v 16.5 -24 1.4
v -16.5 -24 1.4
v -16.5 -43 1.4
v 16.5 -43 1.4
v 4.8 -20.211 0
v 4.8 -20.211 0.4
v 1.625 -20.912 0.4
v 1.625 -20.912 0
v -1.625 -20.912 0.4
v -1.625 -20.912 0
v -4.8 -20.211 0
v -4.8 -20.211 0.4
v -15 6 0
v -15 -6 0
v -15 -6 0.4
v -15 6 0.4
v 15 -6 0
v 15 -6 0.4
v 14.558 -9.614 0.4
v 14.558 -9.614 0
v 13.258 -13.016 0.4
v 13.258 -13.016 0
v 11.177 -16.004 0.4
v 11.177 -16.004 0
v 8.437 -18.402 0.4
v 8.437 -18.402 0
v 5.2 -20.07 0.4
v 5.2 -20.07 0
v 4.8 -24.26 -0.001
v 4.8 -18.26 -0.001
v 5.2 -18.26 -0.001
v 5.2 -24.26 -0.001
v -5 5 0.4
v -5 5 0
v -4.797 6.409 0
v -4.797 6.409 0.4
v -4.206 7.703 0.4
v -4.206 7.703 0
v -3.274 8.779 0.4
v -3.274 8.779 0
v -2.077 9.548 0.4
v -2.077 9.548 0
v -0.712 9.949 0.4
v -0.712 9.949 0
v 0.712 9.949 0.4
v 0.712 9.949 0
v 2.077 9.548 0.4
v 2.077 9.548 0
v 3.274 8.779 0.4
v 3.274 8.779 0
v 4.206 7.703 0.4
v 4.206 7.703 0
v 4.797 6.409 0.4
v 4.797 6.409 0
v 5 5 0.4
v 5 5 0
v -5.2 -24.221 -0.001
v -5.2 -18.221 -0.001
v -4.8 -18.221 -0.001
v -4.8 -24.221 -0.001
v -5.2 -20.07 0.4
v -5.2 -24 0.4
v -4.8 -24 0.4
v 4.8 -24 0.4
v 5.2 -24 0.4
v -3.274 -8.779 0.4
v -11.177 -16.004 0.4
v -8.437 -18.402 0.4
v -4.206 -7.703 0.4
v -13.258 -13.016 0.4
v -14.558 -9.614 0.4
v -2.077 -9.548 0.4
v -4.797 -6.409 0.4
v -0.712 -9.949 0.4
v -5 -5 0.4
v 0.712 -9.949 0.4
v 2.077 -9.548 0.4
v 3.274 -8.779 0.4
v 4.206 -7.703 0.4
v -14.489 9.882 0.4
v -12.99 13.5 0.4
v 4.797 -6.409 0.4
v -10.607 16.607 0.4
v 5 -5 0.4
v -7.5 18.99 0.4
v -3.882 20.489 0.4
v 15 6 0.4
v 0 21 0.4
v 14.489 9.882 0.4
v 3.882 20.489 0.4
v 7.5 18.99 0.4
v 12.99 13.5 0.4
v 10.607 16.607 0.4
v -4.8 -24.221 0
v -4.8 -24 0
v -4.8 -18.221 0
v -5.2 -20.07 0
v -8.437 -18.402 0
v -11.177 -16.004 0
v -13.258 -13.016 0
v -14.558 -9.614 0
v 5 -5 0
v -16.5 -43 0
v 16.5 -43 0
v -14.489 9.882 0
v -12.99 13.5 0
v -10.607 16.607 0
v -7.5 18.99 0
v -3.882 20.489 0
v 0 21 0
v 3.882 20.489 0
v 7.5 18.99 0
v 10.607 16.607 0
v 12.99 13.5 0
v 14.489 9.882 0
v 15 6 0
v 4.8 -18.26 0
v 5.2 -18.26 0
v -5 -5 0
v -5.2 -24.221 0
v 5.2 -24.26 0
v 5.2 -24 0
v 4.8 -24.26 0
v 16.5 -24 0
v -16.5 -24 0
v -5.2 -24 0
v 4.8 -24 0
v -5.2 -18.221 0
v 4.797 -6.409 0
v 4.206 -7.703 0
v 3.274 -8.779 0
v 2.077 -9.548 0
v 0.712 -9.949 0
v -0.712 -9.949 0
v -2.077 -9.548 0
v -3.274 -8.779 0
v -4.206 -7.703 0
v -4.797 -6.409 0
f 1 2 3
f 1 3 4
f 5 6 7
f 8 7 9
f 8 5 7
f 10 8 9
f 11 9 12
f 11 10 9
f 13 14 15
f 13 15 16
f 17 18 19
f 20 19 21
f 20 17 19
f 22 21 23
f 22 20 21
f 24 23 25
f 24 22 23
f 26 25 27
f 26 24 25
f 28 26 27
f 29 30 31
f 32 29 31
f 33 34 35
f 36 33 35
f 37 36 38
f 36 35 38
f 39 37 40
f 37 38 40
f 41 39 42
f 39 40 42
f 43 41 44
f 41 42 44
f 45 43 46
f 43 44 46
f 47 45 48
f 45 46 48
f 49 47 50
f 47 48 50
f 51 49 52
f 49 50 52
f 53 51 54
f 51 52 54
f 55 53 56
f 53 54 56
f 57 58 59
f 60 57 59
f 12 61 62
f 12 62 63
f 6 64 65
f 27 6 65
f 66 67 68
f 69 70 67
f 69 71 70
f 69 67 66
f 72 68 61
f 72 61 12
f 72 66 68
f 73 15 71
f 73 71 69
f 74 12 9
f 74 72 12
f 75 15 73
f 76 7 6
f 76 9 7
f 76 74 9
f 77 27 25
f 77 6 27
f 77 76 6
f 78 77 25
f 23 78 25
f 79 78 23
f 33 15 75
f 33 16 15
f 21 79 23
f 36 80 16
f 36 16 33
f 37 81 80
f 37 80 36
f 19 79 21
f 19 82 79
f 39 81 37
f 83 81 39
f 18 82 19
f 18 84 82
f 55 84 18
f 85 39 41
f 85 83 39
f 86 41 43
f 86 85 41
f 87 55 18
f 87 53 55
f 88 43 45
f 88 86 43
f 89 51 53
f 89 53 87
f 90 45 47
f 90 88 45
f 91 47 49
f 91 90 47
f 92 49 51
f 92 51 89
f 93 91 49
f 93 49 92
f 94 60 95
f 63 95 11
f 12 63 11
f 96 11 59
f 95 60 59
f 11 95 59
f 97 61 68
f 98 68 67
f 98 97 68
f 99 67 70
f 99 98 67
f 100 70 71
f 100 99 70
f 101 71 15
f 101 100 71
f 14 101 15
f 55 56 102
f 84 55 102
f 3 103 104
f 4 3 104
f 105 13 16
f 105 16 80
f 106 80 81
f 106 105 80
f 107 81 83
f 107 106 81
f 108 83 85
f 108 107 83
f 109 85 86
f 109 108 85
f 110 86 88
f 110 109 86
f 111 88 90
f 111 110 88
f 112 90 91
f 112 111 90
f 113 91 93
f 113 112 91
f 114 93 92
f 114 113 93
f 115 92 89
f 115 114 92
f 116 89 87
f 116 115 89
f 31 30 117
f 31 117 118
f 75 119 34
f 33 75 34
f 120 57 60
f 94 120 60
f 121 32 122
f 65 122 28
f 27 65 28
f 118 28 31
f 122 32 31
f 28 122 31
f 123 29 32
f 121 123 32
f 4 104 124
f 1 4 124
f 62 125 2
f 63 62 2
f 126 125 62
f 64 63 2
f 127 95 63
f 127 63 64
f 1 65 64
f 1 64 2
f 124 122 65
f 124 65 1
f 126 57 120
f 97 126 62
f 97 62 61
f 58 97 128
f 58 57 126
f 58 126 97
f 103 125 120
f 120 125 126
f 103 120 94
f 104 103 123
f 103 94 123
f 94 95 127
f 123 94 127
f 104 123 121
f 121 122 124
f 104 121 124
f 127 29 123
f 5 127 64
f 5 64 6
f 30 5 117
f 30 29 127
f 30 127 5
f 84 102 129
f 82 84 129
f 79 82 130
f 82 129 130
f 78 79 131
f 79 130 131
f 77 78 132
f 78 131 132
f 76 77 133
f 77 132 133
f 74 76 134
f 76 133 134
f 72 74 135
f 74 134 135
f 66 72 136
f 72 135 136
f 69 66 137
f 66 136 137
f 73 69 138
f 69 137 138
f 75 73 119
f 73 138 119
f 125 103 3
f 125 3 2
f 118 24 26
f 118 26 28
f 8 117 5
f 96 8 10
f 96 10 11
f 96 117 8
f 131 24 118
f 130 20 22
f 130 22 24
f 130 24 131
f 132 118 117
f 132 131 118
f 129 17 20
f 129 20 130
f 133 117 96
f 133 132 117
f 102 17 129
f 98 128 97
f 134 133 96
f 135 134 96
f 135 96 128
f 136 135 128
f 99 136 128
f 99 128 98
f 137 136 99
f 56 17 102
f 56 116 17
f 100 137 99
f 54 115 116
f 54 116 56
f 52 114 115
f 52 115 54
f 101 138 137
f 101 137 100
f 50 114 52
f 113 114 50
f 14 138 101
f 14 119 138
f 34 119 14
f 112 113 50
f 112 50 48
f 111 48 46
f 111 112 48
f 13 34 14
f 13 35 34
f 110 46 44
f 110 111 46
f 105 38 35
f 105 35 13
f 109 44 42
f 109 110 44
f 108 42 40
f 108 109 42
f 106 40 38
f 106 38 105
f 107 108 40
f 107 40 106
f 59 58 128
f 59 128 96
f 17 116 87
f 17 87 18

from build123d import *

# Parameters (mm, degrees)
BOSS_EXTRUDE1_DEPTH = 0.4
SKETCH2_W           = 33
SKETCH2_H           = 19
BOSS_EXTRUDE2_DEPTH = 1.4
BOSS_EXTRUDE3_START = -0.001
SKETCH3_W           = 0.4
SKETCH3_H           = 6
BOSS_EXTRUDE3_DEPTH = 0.401


with BuildPart() as part:
    # Sketch1 → Boss-Extrude1 (new body)
    with BuildSketch(Plane.XY):
        with BuildLine():
            Line((15, 6), (15, -6))
            ThreePointArc((15, -6), (0, -21), (-15, -6))
            Line((-15, -6), (-15, 6))
            ThreePointArc((-15, 6), (0, 21), (15, 6))
        make_face()
        with BuildLine():
            Line((5, 5), (5, -5))
            ThreePointArc((5, -5), (0, -10), (-5, -5))
            Line((-5, -5), (-5, 5))
            ThreePointArc((-5, 5), (0, 10), (5, 5))
        make_face(mode=Mode.SUBTRACT)
    extrude(amount=BOSS_EXTRUDE1_DEPTH)



with BuildPart() as body_2:
    # Sketch2 → Boss-Extrude2 (new body)
    with BuildSketch(Plane.XY):
        with Locations((0, -33.5)):
            Rectangle(SKETCH2_W, SKETCH2_H)
    extrude(amount=BOSS_EXTRUDE2_DEPTH)


with BuildPart() as part_1:
    add(part.part)

    add(body_2.part)  # Boss-Extrude3 merges body 2
    # Sketch3 → Boss-Extrude3 (add)
    with BuildSketch(Plane.XY.offset(BOSS_EXTRUDE3_START)):
        with Locations((5, -21.260407867)):
            Rectangle(SKETCH3_W, SKETCH3_H)
        with Locations((-5, -21.22123599)):
            Rectangle(SKETCH3_W, SKETCH3_H)
    extrude(amount=BOSS_EXTRUDE3_DEPTH)


solid = part_1.part
